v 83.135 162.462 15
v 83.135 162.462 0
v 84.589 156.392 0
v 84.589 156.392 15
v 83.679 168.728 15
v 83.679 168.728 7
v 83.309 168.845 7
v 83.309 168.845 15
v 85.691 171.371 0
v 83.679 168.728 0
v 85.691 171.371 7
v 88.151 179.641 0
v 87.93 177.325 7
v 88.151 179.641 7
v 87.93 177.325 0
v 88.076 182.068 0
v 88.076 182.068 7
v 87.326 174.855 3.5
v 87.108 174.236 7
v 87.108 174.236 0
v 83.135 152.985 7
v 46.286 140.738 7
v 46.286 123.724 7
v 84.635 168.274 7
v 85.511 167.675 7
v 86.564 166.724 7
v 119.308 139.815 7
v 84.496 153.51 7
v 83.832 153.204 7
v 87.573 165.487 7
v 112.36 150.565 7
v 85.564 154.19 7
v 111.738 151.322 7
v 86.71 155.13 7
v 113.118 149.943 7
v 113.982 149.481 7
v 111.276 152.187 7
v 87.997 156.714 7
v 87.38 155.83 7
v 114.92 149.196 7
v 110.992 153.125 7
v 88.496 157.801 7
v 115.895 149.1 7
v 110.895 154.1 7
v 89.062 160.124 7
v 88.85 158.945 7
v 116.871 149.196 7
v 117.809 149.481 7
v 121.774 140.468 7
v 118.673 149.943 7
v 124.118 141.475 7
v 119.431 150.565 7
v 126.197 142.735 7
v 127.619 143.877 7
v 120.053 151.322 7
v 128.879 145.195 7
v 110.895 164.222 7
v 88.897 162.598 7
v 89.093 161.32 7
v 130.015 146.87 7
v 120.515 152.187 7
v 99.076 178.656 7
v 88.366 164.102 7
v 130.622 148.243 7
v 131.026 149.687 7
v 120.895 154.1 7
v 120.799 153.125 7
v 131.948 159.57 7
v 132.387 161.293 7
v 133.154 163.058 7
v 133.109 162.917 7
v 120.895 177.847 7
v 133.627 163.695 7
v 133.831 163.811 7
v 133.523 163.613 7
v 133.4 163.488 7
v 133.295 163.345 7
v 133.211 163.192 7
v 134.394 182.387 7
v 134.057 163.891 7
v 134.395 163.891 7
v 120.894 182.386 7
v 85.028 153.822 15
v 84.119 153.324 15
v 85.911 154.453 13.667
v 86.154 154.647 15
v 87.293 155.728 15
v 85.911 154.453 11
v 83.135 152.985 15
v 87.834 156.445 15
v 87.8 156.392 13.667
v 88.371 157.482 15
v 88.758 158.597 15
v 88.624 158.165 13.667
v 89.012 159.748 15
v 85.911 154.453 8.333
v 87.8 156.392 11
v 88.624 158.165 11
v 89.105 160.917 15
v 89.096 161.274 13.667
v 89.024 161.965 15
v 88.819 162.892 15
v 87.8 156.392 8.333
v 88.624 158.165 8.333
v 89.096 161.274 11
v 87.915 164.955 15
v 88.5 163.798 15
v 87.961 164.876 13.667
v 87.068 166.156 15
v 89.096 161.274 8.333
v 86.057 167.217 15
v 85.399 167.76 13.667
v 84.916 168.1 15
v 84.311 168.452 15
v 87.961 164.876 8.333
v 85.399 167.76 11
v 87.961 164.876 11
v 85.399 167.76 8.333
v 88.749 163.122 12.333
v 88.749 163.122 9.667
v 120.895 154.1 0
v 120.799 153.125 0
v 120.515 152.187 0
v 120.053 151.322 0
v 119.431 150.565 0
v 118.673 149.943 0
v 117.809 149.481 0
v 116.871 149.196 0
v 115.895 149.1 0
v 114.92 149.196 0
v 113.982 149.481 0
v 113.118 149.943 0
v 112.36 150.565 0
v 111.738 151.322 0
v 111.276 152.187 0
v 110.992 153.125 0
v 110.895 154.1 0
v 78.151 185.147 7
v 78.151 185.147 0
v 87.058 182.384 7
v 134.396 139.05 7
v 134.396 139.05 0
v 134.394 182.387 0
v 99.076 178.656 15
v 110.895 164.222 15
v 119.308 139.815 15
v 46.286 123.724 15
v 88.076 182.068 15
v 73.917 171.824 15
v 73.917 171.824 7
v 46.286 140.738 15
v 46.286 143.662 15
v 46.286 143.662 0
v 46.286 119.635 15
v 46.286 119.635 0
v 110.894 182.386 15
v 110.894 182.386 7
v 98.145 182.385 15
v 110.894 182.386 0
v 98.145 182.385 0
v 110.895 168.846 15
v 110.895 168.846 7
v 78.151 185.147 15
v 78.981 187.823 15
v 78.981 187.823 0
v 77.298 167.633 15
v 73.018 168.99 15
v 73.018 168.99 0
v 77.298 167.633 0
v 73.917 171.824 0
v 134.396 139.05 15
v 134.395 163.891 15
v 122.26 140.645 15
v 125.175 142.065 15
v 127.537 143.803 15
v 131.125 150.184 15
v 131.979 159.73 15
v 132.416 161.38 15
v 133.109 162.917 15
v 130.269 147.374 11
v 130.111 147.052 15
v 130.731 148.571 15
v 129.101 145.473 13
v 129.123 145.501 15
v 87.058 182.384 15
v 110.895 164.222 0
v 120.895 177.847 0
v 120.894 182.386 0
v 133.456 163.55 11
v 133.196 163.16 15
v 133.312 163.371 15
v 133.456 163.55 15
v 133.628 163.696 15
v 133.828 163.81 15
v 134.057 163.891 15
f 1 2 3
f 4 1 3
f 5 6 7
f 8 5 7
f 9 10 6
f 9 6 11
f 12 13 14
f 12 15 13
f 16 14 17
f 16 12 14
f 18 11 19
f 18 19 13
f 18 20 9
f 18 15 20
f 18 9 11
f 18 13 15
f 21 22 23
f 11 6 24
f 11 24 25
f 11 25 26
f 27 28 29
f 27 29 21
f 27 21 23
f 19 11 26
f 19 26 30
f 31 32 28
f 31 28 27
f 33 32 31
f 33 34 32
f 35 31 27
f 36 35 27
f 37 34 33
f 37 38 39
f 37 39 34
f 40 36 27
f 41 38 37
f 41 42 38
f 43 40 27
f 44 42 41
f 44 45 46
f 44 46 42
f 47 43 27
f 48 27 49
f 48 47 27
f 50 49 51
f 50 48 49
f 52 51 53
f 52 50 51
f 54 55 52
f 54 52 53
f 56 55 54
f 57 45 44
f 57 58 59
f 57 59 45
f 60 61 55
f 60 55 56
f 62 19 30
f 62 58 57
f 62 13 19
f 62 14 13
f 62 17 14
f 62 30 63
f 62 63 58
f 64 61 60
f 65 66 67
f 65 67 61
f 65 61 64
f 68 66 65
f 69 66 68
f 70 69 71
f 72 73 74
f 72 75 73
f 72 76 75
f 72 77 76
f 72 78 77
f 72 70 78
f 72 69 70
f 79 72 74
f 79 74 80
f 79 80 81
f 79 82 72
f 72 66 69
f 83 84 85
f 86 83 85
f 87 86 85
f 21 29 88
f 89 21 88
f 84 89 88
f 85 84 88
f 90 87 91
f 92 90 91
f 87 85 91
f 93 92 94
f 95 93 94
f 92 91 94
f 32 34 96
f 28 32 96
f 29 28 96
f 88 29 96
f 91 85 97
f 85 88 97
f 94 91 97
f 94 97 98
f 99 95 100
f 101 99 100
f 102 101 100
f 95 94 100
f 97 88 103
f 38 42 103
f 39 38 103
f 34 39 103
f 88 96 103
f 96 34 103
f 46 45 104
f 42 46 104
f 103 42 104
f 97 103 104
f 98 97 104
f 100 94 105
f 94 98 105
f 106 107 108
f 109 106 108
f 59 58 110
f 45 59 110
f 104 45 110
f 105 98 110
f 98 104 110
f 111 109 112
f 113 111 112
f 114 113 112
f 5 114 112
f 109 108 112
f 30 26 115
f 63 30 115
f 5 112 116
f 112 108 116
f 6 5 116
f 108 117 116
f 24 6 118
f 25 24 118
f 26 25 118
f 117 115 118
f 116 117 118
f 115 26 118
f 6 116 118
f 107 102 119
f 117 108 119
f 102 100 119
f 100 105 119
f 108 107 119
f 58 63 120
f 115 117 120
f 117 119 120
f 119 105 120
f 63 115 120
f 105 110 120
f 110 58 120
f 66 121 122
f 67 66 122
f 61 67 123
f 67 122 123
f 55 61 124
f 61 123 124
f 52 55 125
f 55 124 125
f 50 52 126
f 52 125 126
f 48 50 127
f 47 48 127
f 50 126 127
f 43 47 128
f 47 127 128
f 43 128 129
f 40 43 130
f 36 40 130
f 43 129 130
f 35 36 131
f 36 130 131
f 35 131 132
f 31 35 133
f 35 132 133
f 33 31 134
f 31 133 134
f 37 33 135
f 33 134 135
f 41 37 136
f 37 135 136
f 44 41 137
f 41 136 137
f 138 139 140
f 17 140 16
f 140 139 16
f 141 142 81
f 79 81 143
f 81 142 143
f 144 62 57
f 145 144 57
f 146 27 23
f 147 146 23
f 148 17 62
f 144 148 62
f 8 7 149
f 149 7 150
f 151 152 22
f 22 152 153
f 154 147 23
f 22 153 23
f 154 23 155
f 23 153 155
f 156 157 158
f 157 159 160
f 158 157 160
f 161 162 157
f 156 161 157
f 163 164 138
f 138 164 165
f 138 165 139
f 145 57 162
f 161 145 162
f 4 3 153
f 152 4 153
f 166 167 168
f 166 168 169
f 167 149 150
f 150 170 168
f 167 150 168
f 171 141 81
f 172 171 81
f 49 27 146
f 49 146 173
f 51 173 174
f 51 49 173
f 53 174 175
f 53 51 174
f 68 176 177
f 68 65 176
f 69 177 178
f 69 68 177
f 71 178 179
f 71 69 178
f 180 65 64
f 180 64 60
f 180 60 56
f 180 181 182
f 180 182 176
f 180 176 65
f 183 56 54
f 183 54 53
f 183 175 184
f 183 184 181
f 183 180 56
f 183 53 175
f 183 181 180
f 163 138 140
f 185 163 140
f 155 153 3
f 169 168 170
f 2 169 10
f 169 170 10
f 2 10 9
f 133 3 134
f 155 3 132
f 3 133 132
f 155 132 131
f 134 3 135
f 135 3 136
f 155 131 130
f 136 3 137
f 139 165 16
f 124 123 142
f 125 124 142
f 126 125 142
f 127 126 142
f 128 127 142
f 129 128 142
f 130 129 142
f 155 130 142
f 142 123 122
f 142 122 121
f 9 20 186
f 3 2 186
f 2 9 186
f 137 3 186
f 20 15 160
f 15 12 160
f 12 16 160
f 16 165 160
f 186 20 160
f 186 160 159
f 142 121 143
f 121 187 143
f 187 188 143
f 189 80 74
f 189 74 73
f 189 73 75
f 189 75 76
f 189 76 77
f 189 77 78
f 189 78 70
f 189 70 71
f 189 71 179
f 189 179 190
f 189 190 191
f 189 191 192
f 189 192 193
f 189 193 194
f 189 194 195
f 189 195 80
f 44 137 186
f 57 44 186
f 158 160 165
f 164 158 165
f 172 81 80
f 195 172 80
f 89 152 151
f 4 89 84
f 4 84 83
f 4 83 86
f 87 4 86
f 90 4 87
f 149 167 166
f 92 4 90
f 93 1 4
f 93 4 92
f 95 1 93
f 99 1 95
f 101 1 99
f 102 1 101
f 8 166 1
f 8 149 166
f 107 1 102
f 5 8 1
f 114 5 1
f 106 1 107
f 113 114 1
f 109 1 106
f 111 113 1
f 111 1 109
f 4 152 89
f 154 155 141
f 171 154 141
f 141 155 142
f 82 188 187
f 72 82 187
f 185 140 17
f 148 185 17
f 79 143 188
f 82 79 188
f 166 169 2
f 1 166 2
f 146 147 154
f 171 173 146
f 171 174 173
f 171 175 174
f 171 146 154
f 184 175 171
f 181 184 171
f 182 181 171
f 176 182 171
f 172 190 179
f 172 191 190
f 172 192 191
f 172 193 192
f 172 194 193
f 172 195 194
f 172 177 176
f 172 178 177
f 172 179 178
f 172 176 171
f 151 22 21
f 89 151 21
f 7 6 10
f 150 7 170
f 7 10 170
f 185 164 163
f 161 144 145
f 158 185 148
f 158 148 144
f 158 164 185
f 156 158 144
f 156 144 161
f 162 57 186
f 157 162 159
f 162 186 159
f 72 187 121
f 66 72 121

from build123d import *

# Parameters (mm, degrees)
BOSS_EXTRUDE1_DEPTH = 7
BOSS_EXTRUDE3_DEPTH = 15


with BuildPart() as part:
    # Sketch2 → Boss-Extrude1 (new body)
    with BuildSketch(Plane.XY):
        with BuildLine():
            Line((46.285916799, 119.634724339), (134.396340404, 139.050413551))
            Line((134.396340404, 139.050413551), (134.39379389, 182.38704377))
            Line((134.39379389, 182.38704377), (120.894388682, 182.386250529))
            Line((120.894388682, 182.386250529), (120.894655408, 177.847108131))
            Line((120.894655408, 177.847108131), (120.895456025, 177.847108131))
            Line((120.895456025, 177.847108131), (120.895456025, 154.100245399))
            ThreePointArc((120.895456025, 154.100245399), (115.895456025, 149.100245399), (110.895456025, 154.100245399))
            Line((110.895456025, 154.100245399), (110.895456025, 164.221886849))
            Line((110.895456025, 164.221886849), (110.894388699, 182.385662916))
            Line((110.894388699, 182.385662916), (98.145136748, 182.384913754))
            Line((98.145136748, 182.384913754), (78.980988049, 187.822713754))
            Line((78.980988049, 187.822713754), (78.151086328, 185.147461295))
            Line((78.151086328, 185.147461295), (88.076413708, 182.068482243))
            add(Edge.make_bspline(
                [(83.678693998, 168.728153838), (88.77463375, 174.312097996), (88.076413708, 182.068482243)],
                knots=[0, 0, 0, 1, 1, 1], degree=2))
            Line((83.678693998, 168.728153838), (73.917241092, 171.824383576))
            Line((73.917241092, 171.824383576), (73.018341013, 168.990430176))
            Line((73.018341013, 168.990430176), (77.298136398, 167.632924294))
            Line((77.298136398, 167.632924294), (83.134894854, 162.46237946))
            Line((83.134894854, 162.46237946), (84.589439396, 156.392019708))
            Line((84.589439396, 156.392019708), (46.285916799, 143.661523495))
            Line((46.285916799, 143.661523495), (46.285916799, 119.634724339))
        make_face()
    extrude(amount=BOSS_EXTRUDE1_DEPTH)

    # Sketch2<5> → Boss-Extrude3 (add)
    with BuildSketch(Plane.XY):
        Polygon((87.058472282, 182.384262288), (88.076413708, 182.068482243), (99.075977115, 178.656259752), (110.895456025, 164.221886849), (110.895184282, 168.846419808), (110.894388699, 182.385662916), (98.145136748, 182.384913754), align=None)
        Polygon((78.151086328, 185.147461295), (87.058472282, 182.384262288), (98.145136748, 182.384913754), (78.980988049, 187.822713754), align=None)
        with BuildLine():
            Line((46.285916799, 143.661523495), (46.285916799, 140.73837931))
            Line((46.285916799, 140.73837931), (83.134894854, 152.985445474))
            add(Edge.make_bspline(
                [(83.134894854, 152.985445474), (84.174927516, 153.23074968), (85.840748742, 154.28331709), (87.795600381, 156.094817729), (88.836774052, 158.514861149), (89.609824294, 162.728645553), (87.029154532, 166.875865112), (84.288075, 168.507673549), (83.678693998, 168.728153838)],
                knots=[0, 0, 0, 0, 0.137401343, 0.255123746, 0.340171857, 0.476918897, 0.801613812, 0.887468334, 0.887468334, 0.887468334, 0.887468334], degree=3))
            Line((83.678693998, 168.728153838), (83.308823, 168.845473012))
            add(Edge.make_bspline(
                [(83.308823, 168.845473012), (82.615828523, 169.034245679), (81.877979683, 169.060179847), (81.093974035, 168.846419773)],
                knots=[0.904634429, 0.904634429, 0.904634429, 0.904634429, 1, 1, 1, 1], degree=3))
            Line((81.093974035, 168.846419773), (77.298136398, 167.632924294))
            Line((77.298136398, 167.632924294), (83.134894854, 162.46237946))
            Line((83.134894854, 162.46237946), (84.589439396, 156.392019708))
            Line((84.589439396, 156.392019708), (46.285916799, 143.661523495))
        make_face()
        with BuildLine():
            Line((73.018341013, 168.990430176), (77.298136398, 167.632924294))
            Line((77.298136398, 167.632924294), (81.093974035, 168.846419773))
            add(Edge.make_bspline(
                [(83.308823, 168.845473012), (82.615828523, 169.034245679), (81.877979683, 169.060179847), (81.093974035, 168.846419773)],
                knots=[0.904634429, 0.904634429, 0.904634429, 0.904634429, 1, 1, 1, 1], degree=3))
            Line((83.308823, 168.845473012), (73.917241092, 171.824383576))
            Line((73.917241092, 171.824383576), (73.018341013, 168.990430176))
        make_face()
        with BuildLine():
            Line((119.308499738, 139.814661997), (46.285916799, 123.723673918))
            Line((46.285916799, 123.723673918), (46.285916799, 119.634724339))
            Line((46.285916799, 119.634724339), (134.396340404, 139.050413551))
            Line((134.396340404, 139.050413551), (134.394880743, 163.890947893))
            Line((134.394880743, 163.890947893), (134.0570987, 163.890947893))
            add(Edge.make_bspline(
                [(133.108709045, 162.9170571), (133.328673606, 163.695225929), (134.0570987, 163.890947893)],
                knots=[0, 0, 0, 1, 1, 1], degree=2))
            add(Edge.make_bspline(
                [(119.308499738, 139.814661997), (123.463953154, 140.563007639), (134.082921071, 146.527888), (130.556655112, 158.461365551), (133.108709045, 162.9170571)],
                knots=[0, 0, 0, 0, 0.463455576, 1, 1, 1, 1], degree=3))
        make_face()
    extrude(amount=BOSS_EXTRUDE3_DEPTH)


solid = part.part
